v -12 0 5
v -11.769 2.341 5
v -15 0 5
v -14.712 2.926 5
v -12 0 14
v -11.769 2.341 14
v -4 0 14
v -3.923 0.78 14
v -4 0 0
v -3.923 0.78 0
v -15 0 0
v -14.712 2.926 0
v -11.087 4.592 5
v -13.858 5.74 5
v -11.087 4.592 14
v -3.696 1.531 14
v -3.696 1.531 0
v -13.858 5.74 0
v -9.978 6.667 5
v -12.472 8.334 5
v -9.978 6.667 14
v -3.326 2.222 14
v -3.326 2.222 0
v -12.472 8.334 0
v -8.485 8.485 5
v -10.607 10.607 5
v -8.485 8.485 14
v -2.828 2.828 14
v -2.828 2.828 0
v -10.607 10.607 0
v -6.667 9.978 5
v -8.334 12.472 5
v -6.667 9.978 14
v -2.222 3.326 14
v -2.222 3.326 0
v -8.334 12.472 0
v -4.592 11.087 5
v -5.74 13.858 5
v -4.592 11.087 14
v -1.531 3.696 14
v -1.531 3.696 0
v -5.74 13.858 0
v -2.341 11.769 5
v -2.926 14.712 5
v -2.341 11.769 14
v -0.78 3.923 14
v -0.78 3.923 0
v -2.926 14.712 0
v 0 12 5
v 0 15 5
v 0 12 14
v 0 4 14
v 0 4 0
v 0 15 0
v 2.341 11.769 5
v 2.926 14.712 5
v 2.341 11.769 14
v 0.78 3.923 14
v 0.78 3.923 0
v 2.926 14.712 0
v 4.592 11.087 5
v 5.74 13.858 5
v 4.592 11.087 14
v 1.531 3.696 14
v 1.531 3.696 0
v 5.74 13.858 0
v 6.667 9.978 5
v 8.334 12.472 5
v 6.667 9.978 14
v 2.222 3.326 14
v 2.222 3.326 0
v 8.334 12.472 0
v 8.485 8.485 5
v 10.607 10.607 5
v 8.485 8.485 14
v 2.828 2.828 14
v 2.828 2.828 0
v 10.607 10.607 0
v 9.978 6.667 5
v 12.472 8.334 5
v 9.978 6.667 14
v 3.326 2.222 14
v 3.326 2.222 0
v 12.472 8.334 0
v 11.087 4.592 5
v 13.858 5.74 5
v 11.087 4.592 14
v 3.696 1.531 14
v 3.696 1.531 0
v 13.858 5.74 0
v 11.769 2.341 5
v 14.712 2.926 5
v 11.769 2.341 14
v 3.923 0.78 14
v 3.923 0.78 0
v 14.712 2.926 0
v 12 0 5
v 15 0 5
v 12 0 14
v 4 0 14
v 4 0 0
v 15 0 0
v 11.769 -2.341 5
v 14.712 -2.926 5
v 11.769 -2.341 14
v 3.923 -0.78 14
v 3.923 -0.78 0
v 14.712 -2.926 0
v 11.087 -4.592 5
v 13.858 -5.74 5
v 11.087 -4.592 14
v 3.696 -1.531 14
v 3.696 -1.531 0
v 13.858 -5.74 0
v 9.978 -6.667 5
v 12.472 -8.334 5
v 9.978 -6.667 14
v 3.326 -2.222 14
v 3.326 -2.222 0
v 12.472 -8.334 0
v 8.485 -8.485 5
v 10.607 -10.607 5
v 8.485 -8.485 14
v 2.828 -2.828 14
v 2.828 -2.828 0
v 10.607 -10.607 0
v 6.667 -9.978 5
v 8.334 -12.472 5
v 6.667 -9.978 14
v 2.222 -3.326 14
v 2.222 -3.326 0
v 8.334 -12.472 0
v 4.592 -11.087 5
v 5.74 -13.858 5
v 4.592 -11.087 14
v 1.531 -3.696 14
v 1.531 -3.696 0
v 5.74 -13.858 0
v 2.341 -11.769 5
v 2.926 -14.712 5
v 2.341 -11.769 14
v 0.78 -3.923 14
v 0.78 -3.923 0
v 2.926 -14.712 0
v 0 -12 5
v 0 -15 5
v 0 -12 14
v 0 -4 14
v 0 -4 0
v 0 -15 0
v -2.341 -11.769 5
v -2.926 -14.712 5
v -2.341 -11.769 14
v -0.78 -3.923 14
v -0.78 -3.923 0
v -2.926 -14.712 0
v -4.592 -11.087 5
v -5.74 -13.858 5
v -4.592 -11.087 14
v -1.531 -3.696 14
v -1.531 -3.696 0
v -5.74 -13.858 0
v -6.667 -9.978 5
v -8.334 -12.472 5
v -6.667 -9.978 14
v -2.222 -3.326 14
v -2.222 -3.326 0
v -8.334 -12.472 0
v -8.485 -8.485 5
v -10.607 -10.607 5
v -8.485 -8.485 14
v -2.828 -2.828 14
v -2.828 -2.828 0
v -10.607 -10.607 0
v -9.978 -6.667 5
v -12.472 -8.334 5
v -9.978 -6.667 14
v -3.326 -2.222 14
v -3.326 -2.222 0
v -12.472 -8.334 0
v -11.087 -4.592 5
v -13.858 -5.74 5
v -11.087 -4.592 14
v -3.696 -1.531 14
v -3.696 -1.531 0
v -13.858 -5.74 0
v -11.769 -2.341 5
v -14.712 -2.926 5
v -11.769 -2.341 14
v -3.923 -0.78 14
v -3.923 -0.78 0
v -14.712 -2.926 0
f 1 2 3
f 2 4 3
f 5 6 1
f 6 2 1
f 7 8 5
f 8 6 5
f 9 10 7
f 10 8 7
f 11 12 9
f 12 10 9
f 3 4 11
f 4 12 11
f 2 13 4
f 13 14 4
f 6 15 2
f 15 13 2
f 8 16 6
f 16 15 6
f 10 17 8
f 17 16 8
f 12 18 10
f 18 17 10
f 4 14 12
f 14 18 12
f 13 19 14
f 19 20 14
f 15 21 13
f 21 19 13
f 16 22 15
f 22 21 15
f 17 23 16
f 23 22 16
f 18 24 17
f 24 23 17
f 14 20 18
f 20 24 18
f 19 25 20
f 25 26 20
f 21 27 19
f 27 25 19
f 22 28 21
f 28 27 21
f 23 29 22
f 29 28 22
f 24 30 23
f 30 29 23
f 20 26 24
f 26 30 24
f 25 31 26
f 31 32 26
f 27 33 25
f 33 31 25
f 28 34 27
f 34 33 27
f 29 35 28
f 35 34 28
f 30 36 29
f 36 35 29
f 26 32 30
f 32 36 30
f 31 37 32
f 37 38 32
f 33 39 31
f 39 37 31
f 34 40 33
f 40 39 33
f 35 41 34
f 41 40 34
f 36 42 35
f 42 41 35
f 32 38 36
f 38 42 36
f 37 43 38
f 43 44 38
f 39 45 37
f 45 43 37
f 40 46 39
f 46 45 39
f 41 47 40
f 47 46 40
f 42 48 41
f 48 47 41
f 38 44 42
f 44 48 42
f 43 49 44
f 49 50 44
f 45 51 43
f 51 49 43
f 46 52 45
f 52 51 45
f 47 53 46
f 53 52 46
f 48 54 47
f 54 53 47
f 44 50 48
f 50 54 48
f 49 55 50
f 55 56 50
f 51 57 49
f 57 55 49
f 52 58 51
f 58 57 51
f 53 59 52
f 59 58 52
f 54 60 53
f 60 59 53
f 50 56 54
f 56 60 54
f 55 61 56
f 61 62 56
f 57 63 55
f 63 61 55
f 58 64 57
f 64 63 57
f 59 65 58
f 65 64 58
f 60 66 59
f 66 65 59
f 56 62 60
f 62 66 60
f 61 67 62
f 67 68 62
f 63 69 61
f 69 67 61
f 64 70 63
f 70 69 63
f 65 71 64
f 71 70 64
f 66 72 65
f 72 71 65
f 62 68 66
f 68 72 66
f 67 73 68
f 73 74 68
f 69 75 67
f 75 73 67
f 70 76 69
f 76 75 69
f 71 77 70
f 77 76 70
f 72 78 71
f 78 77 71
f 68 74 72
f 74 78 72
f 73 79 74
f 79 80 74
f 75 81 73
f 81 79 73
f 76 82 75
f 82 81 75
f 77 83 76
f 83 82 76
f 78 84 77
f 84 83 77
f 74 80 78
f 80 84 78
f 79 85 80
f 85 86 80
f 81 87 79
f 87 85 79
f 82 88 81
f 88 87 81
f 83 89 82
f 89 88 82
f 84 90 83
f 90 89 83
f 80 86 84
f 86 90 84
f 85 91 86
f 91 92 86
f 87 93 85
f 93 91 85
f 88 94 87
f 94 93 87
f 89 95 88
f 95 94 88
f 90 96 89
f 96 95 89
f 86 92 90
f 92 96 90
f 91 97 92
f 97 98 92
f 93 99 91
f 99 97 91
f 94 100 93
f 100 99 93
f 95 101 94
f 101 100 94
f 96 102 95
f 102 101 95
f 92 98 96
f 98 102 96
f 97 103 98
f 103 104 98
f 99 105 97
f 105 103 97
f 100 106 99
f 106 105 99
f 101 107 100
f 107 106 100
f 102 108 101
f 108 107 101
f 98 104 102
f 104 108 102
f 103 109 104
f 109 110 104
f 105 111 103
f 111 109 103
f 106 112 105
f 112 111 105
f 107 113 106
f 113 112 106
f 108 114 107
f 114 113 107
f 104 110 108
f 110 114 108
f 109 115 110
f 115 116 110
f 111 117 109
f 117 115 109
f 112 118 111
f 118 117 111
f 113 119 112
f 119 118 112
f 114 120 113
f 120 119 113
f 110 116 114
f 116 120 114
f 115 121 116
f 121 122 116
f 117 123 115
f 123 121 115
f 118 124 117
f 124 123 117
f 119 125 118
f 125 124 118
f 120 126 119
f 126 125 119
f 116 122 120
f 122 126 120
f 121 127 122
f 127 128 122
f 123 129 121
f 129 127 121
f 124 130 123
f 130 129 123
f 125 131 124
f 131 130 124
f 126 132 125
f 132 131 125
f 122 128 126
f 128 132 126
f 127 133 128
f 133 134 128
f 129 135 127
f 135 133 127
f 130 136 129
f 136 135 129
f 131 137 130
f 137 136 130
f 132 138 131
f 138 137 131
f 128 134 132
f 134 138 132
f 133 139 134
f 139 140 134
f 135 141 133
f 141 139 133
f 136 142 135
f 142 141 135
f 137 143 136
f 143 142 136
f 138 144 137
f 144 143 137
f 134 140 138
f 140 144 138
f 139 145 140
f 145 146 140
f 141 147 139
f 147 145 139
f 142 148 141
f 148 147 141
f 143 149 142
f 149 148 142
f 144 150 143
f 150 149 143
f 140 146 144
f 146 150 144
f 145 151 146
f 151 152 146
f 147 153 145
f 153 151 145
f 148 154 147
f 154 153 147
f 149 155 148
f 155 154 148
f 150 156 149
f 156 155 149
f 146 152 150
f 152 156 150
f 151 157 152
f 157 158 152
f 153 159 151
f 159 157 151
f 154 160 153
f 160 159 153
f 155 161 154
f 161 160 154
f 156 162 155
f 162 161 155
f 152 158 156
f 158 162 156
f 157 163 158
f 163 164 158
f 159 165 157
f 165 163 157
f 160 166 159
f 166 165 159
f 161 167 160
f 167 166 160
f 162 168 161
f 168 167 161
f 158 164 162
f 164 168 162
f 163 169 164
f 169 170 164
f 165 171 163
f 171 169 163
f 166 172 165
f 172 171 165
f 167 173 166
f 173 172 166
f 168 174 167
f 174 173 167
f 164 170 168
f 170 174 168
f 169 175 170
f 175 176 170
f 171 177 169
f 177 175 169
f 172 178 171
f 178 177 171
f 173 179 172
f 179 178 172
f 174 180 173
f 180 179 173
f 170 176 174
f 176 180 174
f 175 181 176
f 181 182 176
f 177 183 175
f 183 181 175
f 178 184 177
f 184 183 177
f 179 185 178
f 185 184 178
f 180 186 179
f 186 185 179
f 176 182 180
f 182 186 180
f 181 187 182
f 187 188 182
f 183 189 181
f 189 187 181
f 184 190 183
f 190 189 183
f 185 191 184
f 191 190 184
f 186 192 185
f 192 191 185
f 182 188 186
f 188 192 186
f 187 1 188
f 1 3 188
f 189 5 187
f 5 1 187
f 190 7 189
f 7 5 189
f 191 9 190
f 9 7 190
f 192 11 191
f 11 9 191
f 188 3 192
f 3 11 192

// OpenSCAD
$fn = 32;
// ----------------------------------------------------------------------
// Arc stop: collar, 14 mm thick
// ----------------------------------------------------------------------

// --- parameters (mm) ---
revolve_angle = 360;      // full turn around the Z axis
profile_points = 6;       // points of the closed outline

profile = [[4, 0], [15, 0], [15, 5], [12, 5], [12, 14], [4, 14]];  // single closed polygon, 6 points, counter clockwise

// --- the one profile operation ---
rotate_extrude(angle = revolve_angle) polygon(points = profile);
